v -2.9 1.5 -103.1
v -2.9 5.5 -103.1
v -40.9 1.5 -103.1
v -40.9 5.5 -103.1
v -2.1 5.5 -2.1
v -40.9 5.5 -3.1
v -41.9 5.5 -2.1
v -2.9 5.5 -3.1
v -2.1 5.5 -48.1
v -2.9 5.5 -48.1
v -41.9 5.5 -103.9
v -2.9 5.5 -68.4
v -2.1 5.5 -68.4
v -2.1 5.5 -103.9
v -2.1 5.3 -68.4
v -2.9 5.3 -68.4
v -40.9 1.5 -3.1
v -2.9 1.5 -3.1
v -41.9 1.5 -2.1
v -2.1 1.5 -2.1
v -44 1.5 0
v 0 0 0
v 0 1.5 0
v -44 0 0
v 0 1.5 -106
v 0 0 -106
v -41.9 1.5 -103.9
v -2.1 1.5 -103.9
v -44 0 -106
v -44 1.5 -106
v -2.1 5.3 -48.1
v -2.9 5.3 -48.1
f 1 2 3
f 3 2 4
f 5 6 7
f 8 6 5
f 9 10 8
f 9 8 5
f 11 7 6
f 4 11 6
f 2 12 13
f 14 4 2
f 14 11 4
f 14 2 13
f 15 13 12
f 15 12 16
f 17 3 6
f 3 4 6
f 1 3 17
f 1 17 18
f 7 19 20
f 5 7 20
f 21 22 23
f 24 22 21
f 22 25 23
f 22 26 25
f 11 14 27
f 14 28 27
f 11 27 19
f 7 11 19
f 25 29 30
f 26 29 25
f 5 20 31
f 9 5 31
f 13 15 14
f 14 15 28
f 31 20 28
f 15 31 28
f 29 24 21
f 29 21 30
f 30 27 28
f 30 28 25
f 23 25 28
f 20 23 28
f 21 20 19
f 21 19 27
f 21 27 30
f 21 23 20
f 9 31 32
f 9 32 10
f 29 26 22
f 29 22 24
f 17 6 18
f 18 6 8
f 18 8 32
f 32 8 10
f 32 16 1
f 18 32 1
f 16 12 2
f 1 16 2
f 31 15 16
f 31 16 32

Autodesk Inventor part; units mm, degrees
ref_plane "YZ Plane" through (0, 0, 0) normal (1, 0, 0) x (0, 1, 0)
ref_plane "XZ Plane" through (0, 0, 0) normal (0, 1, 0) x (-1, 0, 0)
ref_plane "XY Plane" through (0, 0, 0) normal (0, 0, 1) x (1, 0, 0)
sketch "плоскость" plane through (0, 0, 0) normal (0, 1, 0) x (-1, 0, 0)
  line L0 (0, 0) -> (44, 0)
  line L1 (44, 0) -> (44, -106)
  line L2 (44, -106) -> (0, -106)
  line L3 (0, -106) -> (0, 0)
  dimension "d0" = 106
  dimension "d1" = 44
extrude "Выдавливание1" add sketch "плоскость" along normal blind 1.5
sketch "Эскиз2" plane through (0, 1.5, 0) normal (0, 1, 0) x (1, 0, 0)
  line L0 (-41.9, 2.1) -> (-2.1, 2.1)
  line L1 (-2.1, 2.1) -> (-2.1, 103.9)
  line L2 (-2.1, 103.9) -> (-41.9, 103.9)
  line L3 (-41.9, 103.9) -> (-41.9, 2.1)
  line L4 (-44, 0) -> (0, 0) projected
  line L5 (-44, 106) -> (-44, 0) projected
  dimension "d4" = 39.8
  dimension "d5" = 101.8
  dimension "d6" = 2.1
  dimension "d20" = 2.1
extrude "Выдавливание2" add sketch "Эскиз2" along normal blind 4
sketch "Эскиз3" plane through (0, 5.5, 0) normal (0, 1, 0) x (1, 0, 0)
  line L0 (-40.9, 3.1) -> (-2.9, 3.1)
  line L1 (-2.9, 3.1) -> (-2.9, 103.1)
  line L2 (-2.9, 103.1) -> (-40.9, 103.1)
  line L3 (-40.9, 103.1) -> (-40.9, 3.1)
  line L4 (-41.9, 103.9) -> (-41.9, 2.1) projected
  line L5 (-41.9, 2.1) -> (-2.1, 2.1) projected
  point P0 (0, 0)
  dimension "d10" = 38
  dimension "d11" = 100
  dimension "d12" = 1
  dimension "d13" = 1
extrude "Выдавливание3" cut sketch "Эскиз3" against normal blind 4
sketch "Эскиз7" plane through (-2.1, 1.5, -2.1) normal (1, 0, 0) x (0, 0, -1)
  line L0 (101, 4) -> (1, 4) projected
  line L1 (66.3, 3.8) -> (46, 3.8)
  line L2 (46, 3.8) -> (46, 4)
  line L3 (46, 4) -> (66.3, 4)
  line L4 (66.3, 4) -> (66.3, 3.8)
  line L5 (101.8, 0) -> (101.8, 4) projected
  point P0 (-2.1, -1.5)
  point P1 (66.3, 4)
  point P2 (101.8, 2)
  point P3 (66.3, 3.9)
  point P4 (51, 4)
  dimension "d18" = 35.5
  dimension "d19" = 0.2
extrude "Выдавливание4" cut sketch "Эскиз7" against normal blind 2
properties part number "roller_deck_01_10_2025"
